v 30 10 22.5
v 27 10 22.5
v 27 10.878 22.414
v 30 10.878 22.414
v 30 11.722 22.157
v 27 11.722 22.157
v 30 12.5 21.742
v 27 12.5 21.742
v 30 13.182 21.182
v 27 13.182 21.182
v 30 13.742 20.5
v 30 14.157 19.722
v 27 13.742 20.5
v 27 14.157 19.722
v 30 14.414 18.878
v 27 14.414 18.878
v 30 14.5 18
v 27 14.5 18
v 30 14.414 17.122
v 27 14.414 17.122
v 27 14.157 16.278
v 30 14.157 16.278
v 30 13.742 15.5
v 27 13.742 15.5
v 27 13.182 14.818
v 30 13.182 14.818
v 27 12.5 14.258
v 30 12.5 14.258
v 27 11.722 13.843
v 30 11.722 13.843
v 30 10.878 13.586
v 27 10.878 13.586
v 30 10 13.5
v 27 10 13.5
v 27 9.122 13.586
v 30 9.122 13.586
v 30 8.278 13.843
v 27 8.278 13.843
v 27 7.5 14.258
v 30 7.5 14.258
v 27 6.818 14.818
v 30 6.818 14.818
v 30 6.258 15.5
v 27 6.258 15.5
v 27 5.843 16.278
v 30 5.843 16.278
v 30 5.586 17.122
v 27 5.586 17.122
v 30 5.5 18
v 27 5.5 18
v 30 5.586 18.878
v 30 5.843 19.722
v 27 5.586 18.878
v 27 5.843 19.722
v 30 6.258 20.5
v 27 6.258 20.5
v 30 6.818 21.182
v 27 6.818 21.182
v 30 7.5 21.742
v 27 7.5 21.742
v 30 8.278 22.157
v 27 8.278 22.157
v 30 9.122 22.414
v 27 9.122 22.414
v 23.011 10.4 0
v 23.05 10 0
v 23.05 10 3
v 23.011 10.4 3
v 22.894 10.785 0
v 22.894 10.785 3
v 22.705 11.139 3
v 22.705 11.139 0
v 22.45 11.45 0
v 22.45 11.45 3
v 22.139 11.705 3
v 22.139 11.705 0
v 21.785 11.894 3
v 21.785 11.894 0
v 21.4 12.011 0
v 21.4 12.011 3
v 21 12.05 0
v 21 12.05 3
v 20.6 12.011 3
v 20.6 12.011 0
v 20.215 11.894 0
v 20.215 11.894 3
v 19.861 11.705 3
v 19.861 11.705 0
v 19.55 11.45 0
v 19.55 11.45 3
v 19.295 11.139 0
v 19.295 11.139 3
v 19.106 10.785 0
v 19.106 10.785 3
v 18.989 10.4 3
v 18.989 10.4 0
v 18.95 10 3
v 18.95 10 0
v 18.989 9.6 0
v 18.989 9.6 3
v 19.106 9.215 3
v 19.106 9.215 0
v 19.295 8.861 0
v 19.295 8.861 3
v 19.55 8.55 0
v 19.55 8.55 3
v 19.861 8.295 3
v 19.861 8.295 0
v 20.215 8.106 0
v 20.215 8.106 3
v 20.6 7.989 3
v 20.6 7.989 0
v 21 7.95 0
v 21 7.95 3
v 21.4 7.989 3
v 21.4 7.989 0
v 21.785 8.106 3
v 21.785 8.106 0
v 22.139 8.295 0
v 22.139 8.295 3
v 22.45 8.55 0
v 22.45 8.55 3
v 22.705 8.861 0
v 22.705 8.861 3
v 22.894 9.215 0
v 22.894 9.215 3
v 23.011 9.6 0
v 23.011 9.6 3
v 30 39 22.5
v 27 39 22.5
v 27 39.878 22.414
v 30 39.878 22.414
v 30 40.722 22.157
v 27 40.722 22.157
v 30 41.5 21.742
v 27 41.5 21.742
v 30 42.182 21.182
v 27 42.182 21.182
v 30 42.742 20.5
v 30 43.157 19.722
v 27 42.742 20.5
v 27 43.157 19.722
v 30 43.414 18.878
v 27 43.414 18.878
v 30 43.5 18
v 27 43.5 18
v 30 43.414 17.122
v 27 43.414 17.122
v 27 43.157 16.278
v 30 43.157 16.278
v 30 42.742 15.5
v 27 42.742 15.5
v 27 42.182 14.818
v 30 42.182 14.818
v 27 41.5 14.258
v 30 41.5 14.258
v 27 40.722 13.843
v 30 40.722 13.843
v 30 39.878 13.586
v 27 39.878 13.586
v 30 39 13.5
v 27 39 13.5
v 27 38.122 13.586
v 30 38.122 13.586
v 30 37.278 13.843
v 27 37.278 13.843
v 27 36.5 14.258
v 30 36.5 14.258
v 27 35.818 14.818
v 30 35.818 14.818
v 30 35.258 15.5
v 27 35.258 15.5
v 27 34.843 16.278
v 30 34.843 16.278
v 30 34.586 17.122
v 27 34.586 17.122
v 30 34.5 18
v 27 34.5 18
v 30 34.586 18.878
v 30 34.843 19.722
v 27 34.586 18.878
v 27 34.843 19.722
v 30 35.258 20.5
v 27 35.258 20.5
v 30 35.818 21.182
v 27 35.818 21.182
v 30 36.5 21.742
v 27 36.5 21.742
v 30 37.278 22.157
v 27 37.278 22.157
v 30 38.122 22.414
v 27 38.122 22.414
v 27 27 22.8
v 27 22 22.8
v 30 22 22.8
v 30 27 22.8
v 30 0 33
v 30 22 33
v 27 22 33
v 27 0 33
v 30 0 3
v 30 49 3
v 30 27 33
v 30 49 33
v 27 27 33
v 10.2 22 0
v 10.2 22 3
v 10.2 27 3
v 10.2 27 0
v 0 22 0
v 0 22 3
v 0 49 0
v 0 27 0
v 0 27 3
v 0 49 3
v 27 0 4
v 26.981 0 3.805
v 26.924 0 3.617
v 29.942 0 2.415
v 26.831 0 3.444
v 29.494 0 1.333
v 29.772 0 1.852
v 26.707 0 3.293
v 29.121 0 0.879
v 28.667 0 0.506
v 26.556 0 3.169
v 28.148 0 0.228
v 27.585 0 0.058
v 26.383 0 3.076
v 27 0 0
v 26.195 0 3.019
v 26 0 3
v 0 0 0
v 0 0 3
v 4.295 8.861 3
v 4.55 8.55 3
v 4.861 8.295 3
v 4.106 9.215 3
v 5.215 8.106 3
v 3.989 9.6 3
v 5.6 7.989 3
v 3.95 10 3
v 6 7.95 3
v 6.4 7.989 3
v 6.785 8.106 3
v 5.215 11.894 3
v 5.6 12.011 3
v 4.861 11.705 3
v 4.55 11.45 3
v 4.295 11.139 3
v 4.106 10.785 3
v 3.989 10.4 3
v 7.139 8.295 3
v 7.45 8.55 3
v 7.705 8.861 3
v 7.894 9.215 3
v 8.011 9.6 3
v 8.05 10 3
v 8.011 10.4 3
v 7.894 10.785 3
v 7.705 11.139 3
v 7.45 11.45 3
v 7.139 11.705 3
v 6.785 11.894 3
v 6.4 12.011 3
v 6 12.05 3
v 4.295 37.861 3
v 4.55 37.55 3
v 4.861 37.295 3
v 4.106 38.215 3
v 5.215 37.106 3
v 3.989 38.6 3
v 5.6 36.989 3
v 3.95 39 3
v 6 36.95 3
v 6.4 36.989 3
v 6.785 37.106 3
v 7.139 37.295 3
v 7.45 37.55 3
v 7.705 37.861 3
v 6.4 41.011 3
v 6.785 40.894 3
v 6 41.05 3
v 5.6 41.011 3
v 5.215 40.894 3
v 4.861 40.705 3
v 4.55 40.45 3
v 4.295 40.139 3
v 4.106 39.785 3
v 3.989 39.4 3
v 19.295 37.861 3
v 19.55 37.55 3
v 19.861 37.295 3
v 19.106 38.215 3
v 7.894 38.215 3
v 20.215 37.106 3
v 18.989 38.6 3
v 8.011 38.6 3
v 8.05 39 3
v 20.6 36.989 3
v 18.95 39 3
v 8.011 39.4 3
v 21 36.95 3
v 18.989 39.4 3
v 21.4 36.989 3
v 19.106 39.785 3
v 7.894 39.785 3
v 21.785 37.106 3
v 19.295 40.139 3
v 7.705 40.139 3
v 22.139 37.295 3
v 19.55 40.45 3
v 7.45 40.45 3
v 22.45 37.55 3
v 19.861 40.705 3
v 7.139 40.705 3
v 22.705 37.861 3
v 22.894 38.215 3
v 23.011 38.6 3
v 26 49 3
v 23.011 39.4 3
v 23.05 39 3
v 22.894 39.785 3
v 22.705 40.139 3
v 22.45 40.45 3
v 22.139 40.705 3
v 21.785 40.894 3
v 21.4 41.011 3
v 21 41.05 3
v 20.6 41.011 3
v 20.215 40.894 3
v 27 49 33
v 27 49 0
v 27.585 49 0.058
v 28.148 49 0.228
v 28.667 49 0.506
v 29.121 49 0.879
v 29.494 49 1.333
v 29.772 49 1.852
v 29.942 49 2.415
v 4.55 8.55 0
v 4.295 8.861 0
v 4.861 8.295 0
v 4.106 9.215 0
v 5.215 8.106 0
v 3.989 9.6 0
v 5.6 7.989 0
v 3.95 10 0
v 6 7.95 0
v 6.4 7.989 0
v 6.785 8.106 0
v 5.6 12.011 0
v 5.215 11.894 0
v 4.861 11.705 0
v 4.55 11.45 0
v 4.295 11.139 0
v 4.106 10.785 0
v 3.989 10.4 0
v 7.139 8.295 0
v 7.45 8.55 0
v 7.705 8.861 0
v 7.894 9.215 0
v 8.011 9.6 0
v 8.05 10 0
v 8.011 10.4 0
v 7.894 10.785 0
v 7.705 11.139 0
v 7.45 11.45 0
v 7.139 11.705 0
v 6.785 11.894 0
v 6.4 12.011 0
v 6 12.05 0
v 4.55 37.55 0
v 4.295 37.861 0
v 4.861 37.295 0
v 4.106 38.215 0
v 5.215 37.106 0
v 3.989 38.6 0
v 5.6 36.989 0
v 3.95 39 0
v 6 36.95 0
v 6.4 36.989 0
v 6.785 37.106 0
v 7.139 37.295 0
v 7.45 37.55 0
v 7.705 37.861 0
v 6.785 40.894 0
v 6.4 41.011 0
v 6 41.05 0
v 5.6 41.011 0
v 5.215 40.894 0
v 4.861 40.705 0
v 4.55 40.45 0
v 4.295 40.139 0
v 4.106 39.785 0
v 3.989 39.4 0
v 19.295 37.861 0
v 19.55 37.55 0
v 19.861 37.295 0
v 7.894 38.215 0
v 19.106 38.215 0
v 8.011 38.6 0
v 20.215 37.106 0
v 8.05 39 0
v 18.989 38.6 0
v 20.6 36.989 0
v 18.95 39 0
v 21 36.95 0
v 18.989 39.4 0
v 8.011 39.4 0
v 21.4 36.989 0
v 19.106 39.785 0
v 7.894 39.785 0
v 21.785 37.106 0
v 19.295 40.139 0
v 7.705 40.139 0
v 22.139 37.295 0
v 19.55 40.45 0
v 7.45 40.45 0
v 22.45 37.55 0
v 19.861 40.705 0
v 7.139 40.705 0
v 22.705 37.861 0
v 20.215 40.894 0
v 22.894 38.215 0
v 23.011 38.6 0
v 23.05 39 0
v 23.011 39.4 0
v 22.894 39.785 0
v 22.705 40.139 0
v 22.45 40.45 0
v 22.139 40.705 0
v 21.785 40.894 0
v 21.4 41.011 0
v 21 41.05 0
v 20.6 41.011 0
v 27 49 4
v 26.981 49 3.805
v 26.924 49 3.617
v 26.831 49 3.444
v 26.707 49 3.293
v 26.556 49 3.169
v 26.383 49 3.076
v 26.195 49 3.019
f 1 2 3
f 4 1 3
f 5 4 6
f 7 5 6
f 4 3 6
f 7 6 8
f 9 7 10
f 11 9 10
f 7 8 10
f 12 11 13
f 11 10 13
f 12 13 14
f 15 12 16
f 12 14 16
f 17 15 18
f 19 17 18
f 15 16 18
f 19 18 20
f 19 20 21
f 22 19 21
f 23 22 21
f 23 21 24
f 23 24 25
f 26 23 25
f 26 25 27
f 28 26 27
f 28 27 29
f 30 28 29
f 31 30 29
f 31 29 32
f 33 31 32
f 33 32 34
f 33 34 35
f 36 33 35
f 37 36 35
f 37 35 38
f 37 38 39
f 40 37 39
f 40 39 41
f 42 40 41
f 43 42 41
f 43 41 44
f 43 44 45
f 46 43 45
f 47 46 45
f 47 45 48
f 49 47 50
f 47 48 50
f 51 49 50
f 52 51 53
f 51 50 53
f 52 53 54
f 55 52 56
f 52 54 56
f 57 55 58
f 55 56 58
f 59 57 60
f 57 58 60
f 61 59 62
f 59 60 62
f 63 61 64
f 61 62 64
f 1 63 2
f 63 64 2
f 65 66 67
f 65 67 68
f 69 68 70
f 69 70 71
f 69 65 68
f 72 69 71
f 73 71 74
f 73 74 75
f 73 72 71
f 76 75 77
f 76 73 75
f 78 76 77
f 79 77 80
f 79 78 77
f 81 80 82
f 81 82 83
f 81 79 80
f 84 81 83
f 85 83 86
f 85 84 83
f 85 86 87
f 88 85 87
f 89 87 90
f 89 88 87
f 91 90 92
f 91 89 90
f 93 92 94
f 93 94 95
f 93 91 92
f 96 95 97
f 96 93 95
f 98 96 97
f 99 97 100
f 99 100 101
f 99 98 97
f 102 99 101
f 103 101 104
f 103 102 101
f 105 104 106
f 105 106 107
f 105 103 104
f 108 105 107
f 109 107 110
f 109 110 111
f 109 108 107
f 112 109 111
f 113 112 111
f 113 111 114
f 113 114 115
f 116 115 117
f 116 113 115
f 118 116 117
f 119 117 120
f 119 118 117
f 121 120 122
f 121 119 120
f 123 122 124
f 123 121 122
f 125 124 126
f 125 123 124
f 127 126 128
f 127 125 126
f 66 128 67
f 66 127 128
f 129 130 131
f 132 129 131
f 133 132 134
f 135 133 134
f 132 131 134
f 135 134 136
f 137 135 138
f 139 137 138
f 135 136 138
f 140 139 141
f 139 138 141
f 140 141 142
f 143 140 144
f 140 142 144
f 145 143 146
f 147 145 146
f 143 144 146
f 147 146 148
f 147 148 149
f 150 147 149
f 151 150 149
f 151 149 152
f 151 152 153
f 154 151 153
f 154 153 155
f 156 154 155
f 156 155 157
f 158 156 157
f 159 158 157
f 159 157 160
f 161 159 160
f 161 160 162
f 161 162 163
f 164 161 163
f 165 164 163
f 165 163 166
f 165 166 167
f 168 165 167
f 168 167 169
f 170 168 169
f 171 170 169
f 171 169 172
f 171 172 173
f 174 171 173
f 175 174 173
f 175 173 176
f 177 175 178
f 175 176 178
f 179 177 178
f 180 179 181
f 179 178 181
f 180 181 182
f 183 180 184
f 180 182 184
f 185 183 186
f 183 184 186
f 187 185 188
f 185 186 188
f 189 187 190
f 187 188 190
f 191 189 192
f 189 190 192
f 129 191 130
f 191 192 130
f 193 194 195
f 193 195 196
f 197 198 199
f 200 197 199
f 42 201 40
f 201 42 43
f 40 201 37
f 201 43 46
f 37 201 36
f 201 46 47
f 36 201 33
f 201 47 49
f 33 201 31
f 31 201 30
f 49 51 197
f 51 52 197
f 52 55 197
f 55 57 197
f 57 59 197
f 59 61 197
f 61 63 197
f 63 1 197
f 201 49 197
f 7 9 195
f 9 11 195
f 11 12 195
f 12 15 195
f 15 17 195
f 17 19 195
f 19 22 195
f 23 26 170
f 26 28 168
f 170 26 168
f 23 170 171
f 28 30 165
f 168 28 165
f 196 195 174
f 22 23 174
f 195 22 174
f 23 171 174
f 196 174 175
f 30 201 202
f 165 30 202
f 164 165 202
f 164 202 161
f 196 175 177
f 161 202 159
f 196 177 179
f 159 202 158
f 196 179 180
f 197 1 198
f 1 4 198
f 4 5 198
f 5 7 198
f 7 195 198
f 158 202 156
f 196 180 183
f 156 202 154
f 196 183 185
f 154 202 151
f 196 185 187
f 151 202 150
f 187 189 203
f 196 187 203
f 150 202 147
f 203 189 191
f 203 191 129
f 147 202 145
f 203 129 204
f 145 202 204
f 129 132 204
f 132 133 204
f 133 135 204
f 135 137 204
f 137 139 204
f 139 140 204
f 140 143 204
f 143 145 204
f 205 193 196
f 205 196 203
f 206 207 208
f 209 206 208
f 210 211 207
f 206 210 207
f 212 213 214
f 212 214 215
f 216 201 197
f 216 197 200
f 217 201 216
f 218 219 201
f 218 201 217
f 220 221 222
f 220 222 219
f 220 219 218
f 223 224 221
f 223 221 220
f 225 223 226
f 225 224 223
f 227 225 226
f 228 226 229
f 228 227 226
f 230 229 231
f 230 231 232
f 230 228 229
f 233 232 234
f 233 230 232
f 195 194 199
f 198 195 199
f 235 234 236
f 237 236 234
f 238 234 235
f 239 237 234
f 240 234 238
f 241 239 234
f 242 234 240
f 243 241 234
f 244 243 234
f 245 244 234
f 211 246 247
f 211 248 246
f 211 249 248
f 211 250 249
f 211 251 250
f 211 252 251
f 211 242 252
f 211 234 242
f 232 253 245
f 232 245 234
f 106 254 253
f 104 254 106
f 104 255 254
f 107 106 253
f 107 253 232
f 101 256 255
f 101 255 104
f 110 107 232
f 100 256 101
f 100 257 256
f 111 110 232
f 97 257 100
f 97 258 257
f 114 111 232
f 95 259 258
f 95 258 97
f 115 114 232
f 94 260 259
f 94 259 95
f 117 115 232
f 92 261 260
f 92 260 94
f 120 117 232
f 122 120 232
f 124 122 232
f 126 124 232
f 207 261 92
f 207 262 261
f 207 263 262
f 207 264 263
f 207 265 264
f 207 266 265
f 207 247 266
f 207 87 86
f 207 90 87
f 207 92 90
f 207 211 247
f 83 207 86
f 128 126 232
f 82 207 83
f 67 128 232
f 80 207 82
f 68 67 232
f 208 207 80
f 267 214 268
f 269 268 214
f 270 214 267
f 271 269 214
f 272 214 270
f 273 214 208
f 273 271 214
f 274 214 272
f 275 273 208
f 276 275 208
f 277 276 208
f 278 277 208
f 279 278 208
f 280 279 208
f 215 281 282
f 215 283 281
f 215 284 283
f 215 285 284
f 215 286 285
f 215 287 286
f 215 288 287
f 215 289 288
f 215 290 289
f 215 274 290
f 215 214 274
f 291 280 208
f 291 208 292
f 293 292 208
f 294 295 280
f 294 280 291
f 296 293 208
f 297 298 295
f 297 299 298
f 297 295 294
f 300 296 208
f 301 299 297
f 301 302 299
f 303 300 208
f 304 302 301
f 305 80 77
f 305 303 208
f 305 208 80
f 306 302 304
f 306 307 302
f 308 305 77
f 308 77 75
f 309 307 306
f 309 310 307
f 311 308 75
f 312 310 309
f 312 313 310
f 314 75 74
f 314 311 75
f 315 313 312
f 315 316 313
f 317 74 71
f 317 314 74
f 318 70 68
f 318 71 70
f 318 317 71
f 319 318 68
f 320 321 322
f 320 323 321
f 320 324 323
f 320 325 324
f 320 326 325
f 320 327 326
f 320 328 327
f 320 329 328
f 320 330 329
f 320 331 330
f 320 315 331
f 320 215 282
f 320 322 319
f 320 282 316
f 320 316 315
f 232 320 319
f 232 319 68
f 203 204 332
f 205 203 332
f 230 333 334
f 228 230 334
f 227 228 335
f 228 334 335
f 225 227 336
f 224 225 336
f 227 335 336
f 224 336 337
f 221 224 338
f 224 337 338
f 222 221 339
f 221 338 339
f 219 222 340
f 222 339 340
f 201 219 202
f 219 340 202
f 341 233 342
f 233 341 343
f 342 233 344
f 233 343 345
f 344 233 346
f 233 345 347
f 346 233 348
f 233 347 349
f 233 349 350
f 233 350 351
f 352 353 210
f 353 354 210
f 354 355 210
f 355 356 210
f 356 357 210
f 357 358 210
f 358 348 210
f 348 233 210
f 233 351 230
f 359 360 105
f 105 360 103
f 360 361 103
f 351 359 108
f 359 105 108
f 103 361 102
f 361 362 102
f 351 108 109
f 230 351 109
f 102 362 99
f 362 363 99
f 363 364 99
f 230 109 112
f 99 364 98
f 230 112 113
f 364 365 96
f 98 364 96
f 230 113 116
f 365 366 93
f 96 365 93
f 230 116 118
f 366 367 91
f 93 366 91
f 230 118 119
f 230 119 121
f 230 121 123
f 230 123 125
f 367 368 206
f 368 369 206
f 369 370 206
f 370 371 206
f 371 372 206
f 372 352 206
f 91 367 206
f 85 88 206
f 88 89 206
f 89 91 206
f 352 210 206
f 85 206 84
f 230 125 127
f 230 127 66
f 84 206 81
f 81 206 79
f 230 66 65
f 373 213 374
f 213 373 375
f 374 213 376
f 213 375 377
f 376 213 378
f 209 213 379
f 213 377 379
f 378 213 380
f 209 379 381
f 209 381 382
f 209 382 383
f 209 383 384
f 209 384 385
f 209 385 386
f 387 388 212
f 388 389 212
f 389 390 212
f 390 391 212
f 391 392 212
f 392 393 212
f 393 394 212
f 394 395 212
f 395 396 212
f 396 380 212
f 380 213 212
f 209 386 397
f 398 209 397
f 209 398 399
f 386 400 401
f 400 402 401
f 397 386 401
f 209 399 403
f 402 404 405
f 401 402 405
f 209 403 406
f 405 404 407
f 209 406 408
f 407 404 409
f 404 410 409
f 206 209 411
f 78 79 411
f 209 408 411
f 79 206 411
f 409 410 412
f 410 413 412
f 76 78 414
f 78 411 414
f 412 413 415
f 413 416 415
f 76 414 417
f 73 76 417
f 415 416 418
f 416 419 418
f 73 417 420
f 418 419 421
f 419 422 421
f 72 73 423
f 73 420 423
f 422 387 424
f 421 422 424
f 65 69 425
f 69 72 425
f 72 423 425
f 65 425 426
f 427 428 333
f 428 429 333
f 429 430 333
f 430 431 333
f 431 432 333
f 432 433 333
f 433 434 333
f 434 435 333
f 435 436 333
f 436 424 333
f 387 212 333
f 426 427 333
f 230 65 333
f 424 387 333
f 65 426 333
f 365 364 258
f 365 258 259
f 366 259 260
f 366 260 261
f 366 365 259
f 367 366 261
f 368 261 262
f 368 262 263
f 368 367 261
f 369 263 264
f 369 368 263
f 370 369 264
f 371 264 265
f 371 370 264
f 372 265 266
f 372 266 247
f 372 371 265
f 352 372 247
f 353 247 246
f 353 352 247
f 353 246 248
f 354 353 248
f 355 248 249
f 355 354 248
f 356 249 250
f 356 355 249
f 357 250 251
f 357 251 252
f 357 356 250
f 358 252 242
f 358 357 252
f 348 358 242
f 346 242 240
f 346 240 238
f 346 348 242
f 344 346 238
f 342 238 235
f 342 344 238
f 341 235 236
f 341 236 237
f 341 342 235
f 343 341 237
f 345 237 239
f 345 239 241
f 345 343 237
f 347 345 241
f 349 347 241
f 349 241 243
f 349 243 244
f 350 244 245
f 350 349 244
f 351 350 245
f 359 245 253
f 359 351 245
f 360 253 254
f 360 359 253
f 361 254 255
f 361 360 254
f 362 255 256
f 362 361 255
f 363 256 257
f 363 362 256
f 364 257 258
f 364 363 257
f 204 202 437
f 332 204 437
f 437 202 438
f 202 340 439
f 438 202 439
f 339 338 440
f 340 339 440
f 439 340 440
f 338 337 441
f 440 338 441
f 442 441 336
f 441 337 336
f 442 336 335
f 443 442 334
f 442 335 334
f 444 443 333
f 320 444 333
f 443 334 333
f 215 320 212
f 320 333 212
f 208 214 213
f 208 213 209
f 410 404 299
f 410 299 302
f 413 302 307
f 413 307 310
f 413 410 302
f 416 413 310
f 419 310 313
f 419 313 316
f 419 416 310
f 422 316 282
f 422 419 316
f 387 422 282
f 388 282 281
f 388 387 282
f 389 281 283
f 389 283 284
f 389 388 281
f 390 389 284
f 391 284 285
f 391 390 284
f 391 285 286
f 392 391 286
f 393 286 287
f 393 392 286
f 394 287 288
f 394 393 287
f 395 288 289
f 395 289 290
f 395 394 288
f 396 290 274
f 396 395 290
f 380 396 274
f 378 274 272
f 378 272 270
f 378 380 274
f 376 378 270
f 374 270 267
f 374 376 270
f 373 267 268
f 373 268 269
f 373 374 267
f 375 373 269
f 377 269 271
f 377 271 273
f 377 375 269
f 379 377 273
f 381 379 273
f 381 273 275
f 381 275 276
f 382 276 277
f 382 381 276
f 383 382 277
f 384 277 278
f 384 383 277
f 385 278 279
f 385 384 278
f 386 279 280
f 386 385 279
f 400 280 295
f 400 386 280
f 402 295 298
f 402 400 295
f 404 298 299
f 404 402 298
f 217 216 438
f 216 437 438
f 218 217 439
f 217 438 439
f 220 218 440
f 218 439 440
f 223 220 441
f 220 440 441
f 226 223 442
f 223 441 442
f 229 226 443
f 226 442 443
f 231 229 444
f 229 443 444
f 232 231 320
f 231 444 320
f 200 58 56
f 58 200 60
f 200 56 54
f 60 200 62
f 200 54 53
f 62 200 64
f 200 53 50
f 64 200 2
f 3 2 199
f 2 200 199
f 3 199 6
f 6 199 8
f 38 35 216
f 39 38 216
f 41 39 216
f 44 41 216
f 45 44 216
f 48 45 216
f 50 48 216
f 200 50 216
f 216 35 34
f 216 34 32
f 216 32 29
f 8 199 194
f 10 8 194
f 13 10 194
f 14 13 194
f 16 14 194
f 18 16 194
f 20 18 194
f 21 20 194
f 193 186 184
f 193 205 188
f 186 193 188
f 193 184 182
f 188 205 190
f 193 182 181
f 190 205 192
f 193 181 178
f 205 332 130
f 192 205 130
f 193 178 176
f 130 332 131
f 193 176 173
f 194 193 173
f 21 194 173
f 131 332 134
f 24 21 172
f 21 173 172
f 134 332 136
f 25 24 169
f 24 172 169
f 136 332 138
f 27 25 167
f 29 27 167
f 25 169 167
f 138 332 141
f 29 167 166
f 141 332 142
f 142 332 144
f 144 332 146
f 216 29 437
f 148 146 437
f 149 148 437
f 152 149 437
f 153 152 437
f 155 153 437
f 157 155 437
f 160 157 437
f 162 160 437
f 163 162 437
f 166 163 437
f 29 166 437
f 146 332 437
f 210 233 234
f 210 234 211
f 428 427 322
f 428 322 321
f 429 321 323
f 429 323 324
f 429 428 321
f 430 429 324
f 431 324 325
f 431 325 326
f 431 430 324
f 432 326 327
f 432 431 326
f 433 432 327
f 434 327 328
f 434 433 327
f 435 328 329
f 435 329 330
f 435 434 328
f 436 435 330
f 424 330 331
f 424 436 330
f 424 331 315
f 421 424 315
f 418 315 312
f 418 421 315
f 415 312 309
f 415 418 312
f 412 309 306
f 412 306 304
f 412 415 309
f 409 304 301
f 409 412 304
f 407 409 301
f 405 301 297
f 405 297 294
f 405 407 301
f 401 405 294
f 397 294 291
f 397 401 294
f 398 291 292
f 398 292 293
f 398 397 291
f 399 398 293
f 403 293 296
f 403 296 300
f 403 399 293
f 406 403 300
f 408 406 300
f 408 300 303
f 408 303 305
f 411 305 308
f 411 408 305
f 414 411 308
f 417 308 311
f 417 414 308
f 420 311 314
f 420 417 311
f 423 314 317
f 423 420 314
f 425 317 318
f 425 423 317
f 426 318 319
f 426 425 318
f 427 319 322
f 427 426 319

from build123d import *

# Parameters (mm, degrees)
SKETCH2_W               = 27
SKETCH2_H               = 49
SKETCH2_R               = 2.05
BOSS_EXTRUDE1_DEPTH     = 3
BOSS_EXTRUDE2_DEPTH     = 49
SKETCH5_R               = 4.5
CUT_EXTRUDE1_DEPTH      = 4
FILLET1_R               = 1
SKETCH6_W               = 13.2
SKETCH6_H               = 5
CUT_EXTRUDE2_DEPTH      = 4
SKETCH7_W               = 10.2
SKETCH7_H               = 5
CUT_EXTRUDE3_DEPTH      = 28
CUT_EXTRUDE3_DEPTH_BACK = 4


with BuildPart() as part:
    # Sketch2 → Boss-Extrude1 (new body)
    with BuildSketch(Plane.XY):
        with Locations((13.5, 24.5)):
            Rectangle(SKETCH2_W, SKETCH2_H)
        with Locations((6, 39)):
            Circle(SKETCH2_R, mode=Mode.SUBTRACT)
        with Locations((21, 39)):
            Circle(SKETCH2_R, mode=Mode.SUBTRACT)
        with Locations((6, 10)):
            Circle(SKETCH2_R, mode=Mode.SUBTRACT)
        with Locations((21, 10)):
            Circle(SKETCH2_R, mode=Mode.SUBTRACT)
    extrude(amount=BOSS_EXTRUDE1_DEPTH)

    # Sketch4 → Boss-Extrude2 (add)
    with BuildSketch(Plane(origin=(0, 49, 0), x_dir=(1, 0, 0), z_dir=(0, 1, 0))):
        with BuildLine():
            Line((30, -3), (30, -33))
            Line((30, -33), (27, -33))
            Line((27, -33), (27, 0))
            ThreePointArc((27, 0), (29.121320344, -0.878679656), (30, -3))
        make_face()
    extrude(amount=-BOSS_EXTRUDE2_DEPTH)

    # Sketch5 → Cut-Extrude1 (cut, through all)
    with BuildSketch(Plane.ZY.offset(-27)):
        with Locations((18, 39)):
            Circle(SKETCH5_R)
        with Locations((18, 10)):
            Circle(SKETCH5_R)
    extrude(amount=-CUT_EXTRUDE1_DEPTH, mode=Mode.SUBTRACT)

    # Fillet1
    fillet1_edges = [part.edges().sort_by_distance(p)[0] for p in [
        (27, 24.5, 3),
    ]]
    fillet(fillet1_edges, radius=FILLET1_R)

    # Sketch6 → Cut-Extrude2 (cut, through all)
    with BuildSketch(Plane.XY.offset(3)):
        with Locations((3.6, 24.5)):
            Rectangle(SKETCH6_W, SKETCH6_H)
    extrude(amount=-CUT_EXTRUDE2_DEPTH, mode=Mode.SUBTRACT)

    # Sketch7 → Cut-Extrude3 (cut, two sides)
    with BuildSketch(Plane.ZY.offset(-27)) as cut_extrude3_sk:
        with Locations((27.9, 24.5)):
            Rectangle(SKETCH7_W, SKETCH7_H)
    extrude(amount=CUT_EXTRUDE3_DEPTH, mode=Mode.SUBTRACT)
    extrude(cut_extrude3_sk.sketch, amount=-CUT_EXTRUDE3_DEPTH_BACK, mode=Mode.SUBTRACT)


solid = part.part
